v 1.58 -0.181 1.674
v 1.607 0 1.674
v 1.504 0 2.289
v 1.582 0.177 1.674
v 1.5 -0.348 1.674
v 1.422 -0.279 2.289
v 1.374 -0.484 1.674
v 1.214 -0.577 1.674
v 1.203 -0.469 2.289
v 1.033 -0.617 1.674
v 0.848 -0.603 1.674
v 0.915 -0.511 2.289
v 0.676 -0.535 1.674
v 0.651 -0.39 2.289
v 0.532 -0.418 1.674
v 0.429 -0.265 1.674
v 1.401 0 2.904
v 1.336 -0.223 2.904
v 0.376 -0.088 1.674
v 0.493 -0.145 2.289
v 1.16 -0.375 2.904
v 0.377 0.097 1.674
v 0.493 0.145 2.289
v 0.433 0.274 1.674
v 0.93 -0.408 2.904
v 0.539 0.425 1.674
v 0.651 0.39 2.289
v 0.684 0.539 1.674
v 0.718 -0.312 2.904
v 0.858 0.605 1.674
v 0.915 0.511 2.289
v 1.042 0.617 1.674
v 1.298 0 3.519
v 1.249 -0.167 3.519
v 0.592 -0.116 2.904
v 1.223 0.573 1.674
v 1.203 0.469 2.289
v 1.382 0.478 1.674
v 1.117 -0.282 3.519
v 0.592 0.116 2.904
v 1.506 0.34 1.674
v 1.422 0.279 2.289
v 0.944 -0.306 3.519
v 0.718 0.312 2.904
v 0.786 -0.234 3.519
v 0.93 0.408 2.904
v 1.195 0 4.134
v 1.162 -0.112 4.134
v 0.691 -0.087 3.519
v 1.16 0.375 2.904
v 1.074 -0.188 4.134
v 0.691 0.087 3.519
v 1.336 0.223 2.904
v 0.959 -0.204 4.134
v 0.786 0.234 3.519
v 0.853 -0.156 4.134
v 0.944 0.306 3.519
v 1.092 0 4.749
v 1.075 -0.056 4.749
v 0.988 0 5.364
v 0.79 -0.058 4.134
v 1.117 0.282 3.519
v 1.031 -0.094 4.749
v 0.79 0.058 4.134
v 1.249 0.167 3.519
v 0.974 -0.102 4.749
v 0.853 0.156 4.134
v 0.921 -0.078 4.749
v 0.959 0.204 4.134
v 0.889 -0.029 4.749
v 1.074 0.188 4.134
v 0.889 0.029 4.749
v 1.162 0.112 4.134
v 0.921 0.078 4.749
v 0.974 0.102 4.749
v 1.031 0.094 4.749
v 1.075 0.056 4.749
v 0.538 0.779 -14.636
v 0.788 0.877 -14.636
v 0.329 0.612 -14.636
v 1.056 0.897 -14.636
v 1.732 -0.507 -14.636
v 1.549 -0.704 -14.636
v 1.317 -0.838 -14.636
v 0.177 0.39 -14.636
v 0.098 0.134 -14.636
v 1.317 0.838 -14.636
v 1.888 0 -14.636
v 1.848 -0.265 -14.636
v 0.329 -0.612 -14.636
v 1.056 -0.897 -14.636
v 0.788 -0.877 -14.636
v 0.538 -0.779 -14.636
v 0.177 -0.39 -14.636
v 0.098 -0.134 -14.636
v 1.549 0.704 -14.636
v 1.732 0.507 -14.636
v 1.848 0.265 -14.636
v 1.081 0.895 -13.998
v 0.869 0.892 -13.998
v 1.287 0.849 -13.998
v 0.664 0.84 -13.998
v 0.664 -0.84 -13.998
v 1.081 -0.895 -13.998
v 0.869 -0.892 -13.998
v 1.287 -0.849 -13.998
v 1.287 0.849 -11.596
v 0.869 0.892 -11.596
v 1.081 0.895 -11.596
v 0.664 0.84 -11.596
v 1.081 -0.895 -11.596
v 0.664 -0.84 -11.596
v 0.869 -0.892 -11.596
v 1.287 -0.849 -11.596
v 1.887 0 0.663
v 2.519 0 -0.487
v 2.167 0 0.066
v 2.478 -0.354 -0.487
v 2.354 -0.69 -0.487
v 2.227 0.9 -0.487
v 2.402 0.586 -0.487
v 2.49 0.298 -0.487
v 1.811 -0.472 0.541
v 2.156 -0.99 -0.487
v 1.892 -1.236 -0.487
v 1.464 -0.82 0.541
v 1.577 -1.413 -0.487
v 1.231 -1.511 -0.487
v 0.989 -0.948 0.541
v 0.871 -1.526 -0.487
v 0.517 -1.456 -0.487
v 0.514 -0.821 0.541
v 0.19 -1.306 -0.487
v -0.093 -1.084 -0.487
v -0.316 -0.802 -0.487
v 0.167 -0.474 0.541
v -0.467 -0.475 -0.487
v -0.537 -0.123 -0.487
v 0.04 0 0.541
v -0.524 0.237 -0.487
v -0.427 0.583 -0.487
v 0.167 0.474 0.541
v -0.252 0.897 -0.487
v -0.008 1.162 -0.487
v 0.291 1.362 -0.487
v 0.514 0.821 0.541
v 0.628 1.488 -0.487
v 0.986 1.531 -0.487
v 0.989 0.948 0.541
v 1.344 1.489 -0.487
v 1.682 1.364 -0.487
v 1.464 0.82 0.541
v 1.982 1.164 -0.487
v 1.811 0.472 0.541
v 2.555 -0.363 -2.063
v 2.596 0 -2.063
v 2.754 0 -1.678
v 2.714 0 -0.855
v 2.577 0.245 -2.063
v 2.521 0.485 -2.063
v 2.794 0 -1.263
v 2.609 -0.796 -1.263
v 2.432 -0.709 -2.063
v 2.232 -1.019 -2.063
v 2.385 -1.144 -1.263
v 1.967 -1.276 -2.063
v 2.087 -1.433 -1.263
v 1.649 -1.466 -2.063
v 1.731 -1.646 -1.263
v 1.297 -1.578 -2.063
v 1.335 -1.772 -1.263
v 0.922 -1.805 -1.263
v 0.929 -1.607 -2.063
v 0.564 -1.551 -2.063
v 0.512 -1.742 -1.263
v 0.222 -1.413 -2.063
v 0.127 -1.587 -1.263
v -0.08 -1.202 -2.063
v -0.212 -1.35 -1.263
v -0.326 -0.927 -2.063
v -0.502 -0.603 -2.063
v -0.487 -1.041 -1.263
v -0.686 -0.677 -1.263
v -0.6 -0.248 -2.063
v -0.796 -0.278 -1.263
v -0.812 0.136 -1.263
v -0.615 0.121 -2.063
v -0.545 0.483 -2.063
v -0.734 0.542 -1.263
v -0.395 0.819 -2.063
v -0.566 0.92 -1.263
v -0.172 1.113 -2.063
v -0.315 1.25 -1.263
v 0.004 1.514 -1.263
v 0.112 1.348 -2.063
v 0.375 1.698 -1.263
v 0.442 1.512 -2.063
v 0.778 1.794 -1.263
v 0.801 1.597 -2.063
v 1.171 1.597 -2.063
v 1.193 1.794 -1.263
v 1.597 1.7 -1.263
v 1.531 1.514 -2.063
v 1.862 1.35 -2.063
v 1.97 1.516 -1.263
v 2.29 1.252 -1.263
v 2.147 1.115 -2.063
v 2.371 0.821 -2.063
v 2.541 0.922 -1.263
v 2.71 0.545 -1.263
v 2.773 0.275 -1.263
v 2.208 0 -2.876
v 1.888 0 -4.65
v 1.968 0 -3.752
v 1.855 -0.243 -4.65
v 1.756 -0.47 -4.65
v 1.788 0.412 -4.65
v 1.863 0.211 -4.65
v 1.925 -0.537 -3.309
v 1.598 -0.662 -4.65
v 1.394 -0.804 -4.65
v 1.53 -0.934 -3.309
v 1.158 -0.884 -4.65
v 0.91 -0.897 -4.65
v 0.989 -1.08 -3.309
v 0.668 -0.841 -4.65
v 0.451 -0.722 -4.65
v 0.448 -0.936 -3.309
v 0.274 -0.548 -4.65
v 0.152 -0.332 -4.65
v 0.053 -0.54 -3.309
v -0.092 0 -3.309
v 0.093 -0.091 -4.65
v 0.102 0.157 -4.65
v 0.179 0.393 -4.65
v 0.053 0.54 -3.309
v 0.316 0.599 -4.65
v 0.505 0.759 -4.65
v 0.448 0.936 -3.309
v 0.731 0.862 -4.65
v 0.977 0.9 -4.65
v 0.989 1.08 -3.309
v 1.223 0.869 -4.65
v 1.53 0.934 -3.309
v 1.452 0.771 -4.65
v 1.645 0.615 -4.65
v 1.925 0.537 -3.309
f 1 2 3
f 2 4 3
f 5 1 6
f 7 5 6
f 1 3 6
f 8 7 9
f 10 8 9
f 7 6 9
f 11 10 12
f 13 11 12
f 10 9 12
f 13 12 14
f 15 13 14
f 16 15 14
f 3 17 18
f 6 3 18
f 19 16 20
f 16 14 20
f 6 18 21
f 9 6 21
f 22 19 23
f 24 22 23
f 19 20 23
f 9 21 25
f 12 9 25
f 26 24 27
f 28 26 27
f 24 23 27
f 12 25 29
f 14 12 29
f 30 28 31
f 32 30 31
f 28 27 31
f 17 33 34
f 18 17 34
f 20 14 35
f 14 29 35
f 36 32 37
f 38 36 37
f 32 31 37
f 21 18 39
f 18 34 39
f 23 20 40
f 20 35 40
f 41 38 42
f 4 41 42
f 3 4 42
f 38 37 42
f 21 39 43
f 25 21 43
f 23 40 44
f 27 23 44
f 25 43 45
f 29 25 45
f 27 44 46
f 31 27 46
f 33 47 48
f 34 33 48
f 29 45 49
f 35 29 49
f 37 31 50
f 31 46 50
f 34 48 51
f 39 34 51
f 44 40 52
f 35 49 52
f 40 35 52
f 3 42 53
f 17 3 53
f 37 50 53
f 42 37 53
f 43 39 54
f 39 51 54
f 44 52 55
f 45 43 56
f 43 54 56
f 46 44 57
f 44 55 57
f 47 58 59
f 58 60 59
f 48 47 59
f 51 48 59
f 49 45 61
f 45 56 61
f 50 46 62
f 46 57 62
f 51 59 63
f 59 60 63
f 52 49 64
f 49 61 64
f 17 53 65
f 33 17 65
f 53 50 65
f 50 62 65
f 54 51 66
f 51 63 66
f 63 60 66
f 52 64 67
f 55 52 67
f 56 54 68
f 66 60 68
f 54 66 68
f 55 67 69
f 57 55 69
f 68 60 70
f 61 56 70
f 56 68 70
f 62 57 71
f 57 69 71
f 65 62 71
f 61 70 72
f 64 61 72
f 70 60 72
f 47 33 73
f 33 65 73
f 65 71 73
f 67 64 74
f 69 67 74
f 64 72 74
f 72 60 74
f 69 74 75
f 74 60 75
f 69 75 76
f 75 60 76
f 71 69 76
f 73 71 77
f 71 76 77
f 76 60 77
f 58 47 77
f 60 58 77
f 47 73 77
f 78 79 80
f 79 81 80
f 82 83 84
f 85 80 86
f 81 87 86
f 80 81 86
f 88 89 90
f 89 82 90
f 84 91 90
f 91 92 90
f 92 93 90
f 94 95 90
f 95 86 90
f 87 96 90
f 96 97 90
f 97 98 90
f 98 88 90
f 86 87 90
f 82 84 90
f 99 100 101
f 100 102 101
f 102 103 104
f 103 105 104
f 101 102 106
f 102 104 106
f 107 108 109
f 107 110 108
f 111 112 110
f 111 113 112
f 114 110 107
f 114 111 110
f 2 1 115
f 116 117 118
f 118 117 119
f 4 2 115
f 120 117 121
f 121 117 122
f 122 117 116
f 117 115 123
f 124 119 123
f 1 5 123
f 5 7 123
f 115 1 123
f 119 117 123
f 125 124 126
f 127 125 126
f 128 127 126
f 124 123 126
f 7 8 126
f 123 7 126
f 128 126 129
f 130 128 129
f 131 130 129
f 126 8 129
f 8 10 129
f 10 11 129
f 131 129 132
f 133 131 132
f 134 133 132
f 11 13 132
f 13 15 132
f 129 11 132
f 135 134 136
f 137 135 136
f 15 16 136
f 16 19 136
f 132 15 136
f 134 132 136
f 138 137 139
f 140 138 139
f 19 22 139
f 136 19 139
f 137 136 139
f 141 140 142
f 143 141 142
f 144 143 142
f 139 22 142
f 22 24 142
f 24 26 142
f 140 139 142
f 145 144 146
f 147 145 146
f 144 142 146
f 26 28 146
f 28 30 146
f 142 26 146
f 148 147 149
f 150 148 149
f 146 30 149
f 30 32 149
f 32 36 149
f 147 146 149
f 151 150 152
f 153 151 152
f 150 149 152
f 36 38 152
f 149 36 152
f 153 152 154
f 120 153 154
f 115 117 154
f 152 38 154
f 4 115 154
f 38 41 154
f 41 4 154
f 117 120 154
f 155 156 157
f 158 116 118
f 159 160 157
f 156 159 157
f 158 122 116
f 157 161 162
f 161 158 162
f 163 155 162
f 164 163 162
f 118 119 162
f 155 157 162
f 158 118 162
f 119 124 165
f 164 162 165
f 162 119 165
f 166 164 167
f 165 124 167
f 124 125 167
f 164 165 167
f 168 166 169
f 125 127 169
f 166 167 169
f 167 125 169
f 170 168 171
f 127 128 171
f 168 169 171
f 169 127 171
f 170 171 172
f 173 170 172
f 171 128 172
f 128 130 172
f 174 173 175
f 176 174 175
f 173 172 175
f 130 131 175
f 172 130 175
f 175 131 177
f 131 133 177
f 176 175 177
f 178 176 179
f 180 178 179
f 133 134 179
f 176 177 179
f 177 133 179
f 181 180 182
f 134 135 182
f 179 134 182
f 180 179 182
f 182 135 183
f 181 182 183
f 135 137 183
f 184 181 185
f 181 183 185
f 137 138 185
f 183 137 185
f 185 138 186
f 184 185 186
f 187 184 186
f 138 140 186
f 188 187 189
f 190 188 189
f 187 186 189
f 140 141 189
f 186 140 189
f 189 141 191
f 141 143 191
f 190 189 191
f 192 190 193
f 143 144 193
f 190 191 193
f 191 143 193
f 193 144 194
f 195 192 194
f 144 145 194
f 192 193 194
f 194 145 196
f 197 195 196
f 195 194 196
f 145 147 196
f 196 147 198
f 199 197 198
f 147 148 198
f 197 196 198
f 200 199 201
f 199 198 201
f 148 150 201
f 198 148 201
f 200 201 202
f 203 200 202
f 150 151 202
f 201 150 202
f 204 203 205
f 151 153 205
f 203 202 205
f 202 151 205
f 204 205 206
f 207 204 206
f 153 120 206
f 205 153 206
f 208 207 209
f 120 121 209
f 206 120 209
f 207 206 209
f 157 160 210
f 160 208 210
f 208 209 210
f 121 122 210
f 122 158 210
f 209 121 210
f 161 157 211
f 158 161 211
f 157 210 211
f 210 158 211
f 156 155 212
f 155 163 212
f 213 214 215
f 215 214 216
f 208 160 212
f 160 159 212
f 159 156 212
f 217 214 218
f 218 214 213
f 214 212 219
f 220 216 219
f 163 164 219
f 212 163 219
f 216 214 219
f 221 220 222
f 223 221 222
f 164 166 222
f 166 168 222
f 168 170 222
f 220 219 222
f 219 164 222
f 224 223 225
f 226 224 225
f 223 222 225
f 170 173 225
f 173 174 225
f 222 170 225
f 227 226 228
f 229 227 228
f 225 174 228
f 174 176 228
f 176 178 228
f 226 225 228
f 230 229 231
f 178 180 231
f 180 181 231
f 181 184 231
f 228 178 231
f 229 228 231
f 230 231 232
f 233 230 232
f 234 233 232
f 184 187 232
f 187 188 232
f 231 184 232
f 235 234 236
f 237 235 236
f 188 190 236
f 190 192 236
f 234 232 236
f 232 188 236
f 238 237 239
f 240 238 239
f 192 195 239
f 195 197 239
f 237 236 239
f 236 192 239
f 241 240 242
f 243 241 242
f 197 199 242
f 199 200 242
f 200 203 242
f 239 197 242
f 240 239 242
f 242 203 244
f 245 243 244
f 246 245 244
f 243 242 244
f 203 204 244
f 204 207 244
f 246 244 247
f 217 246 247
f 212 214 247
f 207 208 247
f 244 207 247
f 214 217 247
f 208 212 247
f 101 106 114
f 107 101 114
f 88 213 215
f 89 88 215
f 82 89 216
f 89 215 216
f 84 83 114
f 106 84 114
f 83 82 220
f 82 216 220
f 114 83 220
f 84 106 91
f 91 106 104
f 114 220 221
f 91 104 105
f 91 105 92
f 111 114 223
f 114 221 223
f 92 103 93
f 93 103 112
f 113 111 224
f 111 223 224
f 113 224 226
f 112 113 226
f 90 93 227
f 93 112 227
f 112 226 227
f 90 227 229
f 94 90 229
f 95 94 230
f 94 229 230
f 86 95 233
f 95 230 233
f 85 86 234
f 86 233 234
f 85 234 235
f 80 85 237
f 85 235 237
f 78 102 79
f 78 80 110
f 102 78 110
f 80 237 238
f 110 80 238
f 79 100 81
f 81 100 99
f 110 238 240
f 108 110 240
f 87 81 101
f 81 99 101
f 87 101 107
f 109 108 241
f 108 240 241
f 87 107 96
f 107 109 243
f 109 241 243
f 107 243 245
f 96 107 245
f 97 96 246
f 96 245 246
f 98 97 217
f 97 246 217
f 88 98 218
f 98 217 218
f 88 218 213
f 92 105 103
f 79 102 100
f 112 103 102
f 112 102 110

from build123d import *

# Parameters (mm, degrees)
F2_W     = 0.6228546263
F2_H     = 2.4024397135
F3_DEPTH = 12.7
F4_R     = 5.08


with BuildPart() as f1:
    # F0 (on Front) → F1 (revolve)
    with BuildSketch(Plane.XZ):
        with BuildLine():
            Line((1.8883474847, 0), (0.9883474847, 5.3636118397))
            Line((0.9883474847, 5.3636118397), (0.9883474847, -14.6363881603))
            Line((0.9883474847, -14.6363881603), (1.8883474847, -14.6363881603))
            Line((1.8883474847, -14.6363881603), (1.8883474847, -2.6669100628))
            ThreePointArc((1.8883474847, -2.6669100628), (2.7959176273, -1.3334550314), (1.8883474847, 0))
        make_face()
    revolve(axis=Axis((0.9883474847, 0, -4.6363881603), (0, 0, -1)))

    # F2 (on Front) → F3 (cut, symmetric)
    with BuildSketch(Plane.XZ):
        with Locations((0.9755069332, -12.7969710156)):
            Rectangle(F2_W, F2_H)
    extrude(amount=F3_DEPTH, both=True, mode=Mode.SUBTRACT)

    # F4
    f4_edges = [f1.edges().sort_by_distance(p)[0] for p in [
        (0.088347, 0, -2.66691),
        (0.088347, 0, 0),
    ]]
    fillet(f4_edges, radius=F4_R)


solid = f1.part
